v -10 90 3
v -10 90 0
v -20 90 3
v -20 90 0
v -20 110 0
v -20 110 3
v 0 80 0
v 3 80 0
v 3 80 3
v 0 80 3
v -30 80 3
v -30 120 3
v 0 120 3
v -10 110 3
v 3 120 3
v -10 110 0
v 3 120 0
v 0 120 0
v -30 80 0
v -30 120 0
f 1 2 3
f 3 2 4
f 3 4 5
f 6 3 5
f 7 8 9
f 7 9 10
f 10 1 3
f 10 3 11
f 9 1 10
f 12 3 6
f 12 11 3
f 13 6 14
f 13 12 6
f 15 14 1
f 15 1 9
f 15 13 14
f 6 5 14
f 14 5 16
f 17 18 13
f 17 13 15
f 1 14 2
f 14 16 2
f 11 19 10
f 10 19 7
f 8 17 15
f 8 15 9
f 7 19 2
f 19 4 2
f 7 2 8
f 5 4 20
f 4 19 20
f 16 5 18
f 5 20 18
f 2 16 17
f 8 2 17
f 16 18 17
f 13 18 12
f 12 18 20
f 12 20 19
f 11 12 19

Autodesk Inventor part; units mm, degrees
ref_plane "YZ Plane" through (0, 0, 0) normal (1, 0, 0) x (0, 1, 0)
ref_plane "XZ Plane" through (0, 0, 0) normal (0, 1, 0) x (-1, 0, 0)
ref_plane "XY Plane" through (0, 0, 0) normal (0, 0, 1) x (1, 0, 0)
sketch "Sketch1" plane through (0, 0, 0) normal (0, 0, 1) x (1, 0, 0)
  line L0 (0, 120) -> (-30, 120)
  line L1 (-30, 120) -> (-30, 80)
  line L2 (-30, 80) -> (0, 80)
  line L3 (-20, 110) -> (-10, 110)
  line L4 (-10, 110) -> (-10, 90)
  line L5 (-10, 90) -> (-20, 90)
  line L6 (-20, 90) -> (-20, 110)
  line L7 (0, 120) -> (3, 120)
  line L8 (3, 120) -> (3, 80)
  line L9 (3, 80) -> (0, 80)
  line L10 (-30, 120) -> (3, 120)
  line L11 (3, 120) -> (3, 80)
  line L12 (3, 80) -> (-30, 80)
  line L13 (-30, 80) -> (-30, 120)
  point P0 (0, 0)
extrude "Extrusion1" add sketch "Sketch1" along normal blind 3
properties part number "kunci"
